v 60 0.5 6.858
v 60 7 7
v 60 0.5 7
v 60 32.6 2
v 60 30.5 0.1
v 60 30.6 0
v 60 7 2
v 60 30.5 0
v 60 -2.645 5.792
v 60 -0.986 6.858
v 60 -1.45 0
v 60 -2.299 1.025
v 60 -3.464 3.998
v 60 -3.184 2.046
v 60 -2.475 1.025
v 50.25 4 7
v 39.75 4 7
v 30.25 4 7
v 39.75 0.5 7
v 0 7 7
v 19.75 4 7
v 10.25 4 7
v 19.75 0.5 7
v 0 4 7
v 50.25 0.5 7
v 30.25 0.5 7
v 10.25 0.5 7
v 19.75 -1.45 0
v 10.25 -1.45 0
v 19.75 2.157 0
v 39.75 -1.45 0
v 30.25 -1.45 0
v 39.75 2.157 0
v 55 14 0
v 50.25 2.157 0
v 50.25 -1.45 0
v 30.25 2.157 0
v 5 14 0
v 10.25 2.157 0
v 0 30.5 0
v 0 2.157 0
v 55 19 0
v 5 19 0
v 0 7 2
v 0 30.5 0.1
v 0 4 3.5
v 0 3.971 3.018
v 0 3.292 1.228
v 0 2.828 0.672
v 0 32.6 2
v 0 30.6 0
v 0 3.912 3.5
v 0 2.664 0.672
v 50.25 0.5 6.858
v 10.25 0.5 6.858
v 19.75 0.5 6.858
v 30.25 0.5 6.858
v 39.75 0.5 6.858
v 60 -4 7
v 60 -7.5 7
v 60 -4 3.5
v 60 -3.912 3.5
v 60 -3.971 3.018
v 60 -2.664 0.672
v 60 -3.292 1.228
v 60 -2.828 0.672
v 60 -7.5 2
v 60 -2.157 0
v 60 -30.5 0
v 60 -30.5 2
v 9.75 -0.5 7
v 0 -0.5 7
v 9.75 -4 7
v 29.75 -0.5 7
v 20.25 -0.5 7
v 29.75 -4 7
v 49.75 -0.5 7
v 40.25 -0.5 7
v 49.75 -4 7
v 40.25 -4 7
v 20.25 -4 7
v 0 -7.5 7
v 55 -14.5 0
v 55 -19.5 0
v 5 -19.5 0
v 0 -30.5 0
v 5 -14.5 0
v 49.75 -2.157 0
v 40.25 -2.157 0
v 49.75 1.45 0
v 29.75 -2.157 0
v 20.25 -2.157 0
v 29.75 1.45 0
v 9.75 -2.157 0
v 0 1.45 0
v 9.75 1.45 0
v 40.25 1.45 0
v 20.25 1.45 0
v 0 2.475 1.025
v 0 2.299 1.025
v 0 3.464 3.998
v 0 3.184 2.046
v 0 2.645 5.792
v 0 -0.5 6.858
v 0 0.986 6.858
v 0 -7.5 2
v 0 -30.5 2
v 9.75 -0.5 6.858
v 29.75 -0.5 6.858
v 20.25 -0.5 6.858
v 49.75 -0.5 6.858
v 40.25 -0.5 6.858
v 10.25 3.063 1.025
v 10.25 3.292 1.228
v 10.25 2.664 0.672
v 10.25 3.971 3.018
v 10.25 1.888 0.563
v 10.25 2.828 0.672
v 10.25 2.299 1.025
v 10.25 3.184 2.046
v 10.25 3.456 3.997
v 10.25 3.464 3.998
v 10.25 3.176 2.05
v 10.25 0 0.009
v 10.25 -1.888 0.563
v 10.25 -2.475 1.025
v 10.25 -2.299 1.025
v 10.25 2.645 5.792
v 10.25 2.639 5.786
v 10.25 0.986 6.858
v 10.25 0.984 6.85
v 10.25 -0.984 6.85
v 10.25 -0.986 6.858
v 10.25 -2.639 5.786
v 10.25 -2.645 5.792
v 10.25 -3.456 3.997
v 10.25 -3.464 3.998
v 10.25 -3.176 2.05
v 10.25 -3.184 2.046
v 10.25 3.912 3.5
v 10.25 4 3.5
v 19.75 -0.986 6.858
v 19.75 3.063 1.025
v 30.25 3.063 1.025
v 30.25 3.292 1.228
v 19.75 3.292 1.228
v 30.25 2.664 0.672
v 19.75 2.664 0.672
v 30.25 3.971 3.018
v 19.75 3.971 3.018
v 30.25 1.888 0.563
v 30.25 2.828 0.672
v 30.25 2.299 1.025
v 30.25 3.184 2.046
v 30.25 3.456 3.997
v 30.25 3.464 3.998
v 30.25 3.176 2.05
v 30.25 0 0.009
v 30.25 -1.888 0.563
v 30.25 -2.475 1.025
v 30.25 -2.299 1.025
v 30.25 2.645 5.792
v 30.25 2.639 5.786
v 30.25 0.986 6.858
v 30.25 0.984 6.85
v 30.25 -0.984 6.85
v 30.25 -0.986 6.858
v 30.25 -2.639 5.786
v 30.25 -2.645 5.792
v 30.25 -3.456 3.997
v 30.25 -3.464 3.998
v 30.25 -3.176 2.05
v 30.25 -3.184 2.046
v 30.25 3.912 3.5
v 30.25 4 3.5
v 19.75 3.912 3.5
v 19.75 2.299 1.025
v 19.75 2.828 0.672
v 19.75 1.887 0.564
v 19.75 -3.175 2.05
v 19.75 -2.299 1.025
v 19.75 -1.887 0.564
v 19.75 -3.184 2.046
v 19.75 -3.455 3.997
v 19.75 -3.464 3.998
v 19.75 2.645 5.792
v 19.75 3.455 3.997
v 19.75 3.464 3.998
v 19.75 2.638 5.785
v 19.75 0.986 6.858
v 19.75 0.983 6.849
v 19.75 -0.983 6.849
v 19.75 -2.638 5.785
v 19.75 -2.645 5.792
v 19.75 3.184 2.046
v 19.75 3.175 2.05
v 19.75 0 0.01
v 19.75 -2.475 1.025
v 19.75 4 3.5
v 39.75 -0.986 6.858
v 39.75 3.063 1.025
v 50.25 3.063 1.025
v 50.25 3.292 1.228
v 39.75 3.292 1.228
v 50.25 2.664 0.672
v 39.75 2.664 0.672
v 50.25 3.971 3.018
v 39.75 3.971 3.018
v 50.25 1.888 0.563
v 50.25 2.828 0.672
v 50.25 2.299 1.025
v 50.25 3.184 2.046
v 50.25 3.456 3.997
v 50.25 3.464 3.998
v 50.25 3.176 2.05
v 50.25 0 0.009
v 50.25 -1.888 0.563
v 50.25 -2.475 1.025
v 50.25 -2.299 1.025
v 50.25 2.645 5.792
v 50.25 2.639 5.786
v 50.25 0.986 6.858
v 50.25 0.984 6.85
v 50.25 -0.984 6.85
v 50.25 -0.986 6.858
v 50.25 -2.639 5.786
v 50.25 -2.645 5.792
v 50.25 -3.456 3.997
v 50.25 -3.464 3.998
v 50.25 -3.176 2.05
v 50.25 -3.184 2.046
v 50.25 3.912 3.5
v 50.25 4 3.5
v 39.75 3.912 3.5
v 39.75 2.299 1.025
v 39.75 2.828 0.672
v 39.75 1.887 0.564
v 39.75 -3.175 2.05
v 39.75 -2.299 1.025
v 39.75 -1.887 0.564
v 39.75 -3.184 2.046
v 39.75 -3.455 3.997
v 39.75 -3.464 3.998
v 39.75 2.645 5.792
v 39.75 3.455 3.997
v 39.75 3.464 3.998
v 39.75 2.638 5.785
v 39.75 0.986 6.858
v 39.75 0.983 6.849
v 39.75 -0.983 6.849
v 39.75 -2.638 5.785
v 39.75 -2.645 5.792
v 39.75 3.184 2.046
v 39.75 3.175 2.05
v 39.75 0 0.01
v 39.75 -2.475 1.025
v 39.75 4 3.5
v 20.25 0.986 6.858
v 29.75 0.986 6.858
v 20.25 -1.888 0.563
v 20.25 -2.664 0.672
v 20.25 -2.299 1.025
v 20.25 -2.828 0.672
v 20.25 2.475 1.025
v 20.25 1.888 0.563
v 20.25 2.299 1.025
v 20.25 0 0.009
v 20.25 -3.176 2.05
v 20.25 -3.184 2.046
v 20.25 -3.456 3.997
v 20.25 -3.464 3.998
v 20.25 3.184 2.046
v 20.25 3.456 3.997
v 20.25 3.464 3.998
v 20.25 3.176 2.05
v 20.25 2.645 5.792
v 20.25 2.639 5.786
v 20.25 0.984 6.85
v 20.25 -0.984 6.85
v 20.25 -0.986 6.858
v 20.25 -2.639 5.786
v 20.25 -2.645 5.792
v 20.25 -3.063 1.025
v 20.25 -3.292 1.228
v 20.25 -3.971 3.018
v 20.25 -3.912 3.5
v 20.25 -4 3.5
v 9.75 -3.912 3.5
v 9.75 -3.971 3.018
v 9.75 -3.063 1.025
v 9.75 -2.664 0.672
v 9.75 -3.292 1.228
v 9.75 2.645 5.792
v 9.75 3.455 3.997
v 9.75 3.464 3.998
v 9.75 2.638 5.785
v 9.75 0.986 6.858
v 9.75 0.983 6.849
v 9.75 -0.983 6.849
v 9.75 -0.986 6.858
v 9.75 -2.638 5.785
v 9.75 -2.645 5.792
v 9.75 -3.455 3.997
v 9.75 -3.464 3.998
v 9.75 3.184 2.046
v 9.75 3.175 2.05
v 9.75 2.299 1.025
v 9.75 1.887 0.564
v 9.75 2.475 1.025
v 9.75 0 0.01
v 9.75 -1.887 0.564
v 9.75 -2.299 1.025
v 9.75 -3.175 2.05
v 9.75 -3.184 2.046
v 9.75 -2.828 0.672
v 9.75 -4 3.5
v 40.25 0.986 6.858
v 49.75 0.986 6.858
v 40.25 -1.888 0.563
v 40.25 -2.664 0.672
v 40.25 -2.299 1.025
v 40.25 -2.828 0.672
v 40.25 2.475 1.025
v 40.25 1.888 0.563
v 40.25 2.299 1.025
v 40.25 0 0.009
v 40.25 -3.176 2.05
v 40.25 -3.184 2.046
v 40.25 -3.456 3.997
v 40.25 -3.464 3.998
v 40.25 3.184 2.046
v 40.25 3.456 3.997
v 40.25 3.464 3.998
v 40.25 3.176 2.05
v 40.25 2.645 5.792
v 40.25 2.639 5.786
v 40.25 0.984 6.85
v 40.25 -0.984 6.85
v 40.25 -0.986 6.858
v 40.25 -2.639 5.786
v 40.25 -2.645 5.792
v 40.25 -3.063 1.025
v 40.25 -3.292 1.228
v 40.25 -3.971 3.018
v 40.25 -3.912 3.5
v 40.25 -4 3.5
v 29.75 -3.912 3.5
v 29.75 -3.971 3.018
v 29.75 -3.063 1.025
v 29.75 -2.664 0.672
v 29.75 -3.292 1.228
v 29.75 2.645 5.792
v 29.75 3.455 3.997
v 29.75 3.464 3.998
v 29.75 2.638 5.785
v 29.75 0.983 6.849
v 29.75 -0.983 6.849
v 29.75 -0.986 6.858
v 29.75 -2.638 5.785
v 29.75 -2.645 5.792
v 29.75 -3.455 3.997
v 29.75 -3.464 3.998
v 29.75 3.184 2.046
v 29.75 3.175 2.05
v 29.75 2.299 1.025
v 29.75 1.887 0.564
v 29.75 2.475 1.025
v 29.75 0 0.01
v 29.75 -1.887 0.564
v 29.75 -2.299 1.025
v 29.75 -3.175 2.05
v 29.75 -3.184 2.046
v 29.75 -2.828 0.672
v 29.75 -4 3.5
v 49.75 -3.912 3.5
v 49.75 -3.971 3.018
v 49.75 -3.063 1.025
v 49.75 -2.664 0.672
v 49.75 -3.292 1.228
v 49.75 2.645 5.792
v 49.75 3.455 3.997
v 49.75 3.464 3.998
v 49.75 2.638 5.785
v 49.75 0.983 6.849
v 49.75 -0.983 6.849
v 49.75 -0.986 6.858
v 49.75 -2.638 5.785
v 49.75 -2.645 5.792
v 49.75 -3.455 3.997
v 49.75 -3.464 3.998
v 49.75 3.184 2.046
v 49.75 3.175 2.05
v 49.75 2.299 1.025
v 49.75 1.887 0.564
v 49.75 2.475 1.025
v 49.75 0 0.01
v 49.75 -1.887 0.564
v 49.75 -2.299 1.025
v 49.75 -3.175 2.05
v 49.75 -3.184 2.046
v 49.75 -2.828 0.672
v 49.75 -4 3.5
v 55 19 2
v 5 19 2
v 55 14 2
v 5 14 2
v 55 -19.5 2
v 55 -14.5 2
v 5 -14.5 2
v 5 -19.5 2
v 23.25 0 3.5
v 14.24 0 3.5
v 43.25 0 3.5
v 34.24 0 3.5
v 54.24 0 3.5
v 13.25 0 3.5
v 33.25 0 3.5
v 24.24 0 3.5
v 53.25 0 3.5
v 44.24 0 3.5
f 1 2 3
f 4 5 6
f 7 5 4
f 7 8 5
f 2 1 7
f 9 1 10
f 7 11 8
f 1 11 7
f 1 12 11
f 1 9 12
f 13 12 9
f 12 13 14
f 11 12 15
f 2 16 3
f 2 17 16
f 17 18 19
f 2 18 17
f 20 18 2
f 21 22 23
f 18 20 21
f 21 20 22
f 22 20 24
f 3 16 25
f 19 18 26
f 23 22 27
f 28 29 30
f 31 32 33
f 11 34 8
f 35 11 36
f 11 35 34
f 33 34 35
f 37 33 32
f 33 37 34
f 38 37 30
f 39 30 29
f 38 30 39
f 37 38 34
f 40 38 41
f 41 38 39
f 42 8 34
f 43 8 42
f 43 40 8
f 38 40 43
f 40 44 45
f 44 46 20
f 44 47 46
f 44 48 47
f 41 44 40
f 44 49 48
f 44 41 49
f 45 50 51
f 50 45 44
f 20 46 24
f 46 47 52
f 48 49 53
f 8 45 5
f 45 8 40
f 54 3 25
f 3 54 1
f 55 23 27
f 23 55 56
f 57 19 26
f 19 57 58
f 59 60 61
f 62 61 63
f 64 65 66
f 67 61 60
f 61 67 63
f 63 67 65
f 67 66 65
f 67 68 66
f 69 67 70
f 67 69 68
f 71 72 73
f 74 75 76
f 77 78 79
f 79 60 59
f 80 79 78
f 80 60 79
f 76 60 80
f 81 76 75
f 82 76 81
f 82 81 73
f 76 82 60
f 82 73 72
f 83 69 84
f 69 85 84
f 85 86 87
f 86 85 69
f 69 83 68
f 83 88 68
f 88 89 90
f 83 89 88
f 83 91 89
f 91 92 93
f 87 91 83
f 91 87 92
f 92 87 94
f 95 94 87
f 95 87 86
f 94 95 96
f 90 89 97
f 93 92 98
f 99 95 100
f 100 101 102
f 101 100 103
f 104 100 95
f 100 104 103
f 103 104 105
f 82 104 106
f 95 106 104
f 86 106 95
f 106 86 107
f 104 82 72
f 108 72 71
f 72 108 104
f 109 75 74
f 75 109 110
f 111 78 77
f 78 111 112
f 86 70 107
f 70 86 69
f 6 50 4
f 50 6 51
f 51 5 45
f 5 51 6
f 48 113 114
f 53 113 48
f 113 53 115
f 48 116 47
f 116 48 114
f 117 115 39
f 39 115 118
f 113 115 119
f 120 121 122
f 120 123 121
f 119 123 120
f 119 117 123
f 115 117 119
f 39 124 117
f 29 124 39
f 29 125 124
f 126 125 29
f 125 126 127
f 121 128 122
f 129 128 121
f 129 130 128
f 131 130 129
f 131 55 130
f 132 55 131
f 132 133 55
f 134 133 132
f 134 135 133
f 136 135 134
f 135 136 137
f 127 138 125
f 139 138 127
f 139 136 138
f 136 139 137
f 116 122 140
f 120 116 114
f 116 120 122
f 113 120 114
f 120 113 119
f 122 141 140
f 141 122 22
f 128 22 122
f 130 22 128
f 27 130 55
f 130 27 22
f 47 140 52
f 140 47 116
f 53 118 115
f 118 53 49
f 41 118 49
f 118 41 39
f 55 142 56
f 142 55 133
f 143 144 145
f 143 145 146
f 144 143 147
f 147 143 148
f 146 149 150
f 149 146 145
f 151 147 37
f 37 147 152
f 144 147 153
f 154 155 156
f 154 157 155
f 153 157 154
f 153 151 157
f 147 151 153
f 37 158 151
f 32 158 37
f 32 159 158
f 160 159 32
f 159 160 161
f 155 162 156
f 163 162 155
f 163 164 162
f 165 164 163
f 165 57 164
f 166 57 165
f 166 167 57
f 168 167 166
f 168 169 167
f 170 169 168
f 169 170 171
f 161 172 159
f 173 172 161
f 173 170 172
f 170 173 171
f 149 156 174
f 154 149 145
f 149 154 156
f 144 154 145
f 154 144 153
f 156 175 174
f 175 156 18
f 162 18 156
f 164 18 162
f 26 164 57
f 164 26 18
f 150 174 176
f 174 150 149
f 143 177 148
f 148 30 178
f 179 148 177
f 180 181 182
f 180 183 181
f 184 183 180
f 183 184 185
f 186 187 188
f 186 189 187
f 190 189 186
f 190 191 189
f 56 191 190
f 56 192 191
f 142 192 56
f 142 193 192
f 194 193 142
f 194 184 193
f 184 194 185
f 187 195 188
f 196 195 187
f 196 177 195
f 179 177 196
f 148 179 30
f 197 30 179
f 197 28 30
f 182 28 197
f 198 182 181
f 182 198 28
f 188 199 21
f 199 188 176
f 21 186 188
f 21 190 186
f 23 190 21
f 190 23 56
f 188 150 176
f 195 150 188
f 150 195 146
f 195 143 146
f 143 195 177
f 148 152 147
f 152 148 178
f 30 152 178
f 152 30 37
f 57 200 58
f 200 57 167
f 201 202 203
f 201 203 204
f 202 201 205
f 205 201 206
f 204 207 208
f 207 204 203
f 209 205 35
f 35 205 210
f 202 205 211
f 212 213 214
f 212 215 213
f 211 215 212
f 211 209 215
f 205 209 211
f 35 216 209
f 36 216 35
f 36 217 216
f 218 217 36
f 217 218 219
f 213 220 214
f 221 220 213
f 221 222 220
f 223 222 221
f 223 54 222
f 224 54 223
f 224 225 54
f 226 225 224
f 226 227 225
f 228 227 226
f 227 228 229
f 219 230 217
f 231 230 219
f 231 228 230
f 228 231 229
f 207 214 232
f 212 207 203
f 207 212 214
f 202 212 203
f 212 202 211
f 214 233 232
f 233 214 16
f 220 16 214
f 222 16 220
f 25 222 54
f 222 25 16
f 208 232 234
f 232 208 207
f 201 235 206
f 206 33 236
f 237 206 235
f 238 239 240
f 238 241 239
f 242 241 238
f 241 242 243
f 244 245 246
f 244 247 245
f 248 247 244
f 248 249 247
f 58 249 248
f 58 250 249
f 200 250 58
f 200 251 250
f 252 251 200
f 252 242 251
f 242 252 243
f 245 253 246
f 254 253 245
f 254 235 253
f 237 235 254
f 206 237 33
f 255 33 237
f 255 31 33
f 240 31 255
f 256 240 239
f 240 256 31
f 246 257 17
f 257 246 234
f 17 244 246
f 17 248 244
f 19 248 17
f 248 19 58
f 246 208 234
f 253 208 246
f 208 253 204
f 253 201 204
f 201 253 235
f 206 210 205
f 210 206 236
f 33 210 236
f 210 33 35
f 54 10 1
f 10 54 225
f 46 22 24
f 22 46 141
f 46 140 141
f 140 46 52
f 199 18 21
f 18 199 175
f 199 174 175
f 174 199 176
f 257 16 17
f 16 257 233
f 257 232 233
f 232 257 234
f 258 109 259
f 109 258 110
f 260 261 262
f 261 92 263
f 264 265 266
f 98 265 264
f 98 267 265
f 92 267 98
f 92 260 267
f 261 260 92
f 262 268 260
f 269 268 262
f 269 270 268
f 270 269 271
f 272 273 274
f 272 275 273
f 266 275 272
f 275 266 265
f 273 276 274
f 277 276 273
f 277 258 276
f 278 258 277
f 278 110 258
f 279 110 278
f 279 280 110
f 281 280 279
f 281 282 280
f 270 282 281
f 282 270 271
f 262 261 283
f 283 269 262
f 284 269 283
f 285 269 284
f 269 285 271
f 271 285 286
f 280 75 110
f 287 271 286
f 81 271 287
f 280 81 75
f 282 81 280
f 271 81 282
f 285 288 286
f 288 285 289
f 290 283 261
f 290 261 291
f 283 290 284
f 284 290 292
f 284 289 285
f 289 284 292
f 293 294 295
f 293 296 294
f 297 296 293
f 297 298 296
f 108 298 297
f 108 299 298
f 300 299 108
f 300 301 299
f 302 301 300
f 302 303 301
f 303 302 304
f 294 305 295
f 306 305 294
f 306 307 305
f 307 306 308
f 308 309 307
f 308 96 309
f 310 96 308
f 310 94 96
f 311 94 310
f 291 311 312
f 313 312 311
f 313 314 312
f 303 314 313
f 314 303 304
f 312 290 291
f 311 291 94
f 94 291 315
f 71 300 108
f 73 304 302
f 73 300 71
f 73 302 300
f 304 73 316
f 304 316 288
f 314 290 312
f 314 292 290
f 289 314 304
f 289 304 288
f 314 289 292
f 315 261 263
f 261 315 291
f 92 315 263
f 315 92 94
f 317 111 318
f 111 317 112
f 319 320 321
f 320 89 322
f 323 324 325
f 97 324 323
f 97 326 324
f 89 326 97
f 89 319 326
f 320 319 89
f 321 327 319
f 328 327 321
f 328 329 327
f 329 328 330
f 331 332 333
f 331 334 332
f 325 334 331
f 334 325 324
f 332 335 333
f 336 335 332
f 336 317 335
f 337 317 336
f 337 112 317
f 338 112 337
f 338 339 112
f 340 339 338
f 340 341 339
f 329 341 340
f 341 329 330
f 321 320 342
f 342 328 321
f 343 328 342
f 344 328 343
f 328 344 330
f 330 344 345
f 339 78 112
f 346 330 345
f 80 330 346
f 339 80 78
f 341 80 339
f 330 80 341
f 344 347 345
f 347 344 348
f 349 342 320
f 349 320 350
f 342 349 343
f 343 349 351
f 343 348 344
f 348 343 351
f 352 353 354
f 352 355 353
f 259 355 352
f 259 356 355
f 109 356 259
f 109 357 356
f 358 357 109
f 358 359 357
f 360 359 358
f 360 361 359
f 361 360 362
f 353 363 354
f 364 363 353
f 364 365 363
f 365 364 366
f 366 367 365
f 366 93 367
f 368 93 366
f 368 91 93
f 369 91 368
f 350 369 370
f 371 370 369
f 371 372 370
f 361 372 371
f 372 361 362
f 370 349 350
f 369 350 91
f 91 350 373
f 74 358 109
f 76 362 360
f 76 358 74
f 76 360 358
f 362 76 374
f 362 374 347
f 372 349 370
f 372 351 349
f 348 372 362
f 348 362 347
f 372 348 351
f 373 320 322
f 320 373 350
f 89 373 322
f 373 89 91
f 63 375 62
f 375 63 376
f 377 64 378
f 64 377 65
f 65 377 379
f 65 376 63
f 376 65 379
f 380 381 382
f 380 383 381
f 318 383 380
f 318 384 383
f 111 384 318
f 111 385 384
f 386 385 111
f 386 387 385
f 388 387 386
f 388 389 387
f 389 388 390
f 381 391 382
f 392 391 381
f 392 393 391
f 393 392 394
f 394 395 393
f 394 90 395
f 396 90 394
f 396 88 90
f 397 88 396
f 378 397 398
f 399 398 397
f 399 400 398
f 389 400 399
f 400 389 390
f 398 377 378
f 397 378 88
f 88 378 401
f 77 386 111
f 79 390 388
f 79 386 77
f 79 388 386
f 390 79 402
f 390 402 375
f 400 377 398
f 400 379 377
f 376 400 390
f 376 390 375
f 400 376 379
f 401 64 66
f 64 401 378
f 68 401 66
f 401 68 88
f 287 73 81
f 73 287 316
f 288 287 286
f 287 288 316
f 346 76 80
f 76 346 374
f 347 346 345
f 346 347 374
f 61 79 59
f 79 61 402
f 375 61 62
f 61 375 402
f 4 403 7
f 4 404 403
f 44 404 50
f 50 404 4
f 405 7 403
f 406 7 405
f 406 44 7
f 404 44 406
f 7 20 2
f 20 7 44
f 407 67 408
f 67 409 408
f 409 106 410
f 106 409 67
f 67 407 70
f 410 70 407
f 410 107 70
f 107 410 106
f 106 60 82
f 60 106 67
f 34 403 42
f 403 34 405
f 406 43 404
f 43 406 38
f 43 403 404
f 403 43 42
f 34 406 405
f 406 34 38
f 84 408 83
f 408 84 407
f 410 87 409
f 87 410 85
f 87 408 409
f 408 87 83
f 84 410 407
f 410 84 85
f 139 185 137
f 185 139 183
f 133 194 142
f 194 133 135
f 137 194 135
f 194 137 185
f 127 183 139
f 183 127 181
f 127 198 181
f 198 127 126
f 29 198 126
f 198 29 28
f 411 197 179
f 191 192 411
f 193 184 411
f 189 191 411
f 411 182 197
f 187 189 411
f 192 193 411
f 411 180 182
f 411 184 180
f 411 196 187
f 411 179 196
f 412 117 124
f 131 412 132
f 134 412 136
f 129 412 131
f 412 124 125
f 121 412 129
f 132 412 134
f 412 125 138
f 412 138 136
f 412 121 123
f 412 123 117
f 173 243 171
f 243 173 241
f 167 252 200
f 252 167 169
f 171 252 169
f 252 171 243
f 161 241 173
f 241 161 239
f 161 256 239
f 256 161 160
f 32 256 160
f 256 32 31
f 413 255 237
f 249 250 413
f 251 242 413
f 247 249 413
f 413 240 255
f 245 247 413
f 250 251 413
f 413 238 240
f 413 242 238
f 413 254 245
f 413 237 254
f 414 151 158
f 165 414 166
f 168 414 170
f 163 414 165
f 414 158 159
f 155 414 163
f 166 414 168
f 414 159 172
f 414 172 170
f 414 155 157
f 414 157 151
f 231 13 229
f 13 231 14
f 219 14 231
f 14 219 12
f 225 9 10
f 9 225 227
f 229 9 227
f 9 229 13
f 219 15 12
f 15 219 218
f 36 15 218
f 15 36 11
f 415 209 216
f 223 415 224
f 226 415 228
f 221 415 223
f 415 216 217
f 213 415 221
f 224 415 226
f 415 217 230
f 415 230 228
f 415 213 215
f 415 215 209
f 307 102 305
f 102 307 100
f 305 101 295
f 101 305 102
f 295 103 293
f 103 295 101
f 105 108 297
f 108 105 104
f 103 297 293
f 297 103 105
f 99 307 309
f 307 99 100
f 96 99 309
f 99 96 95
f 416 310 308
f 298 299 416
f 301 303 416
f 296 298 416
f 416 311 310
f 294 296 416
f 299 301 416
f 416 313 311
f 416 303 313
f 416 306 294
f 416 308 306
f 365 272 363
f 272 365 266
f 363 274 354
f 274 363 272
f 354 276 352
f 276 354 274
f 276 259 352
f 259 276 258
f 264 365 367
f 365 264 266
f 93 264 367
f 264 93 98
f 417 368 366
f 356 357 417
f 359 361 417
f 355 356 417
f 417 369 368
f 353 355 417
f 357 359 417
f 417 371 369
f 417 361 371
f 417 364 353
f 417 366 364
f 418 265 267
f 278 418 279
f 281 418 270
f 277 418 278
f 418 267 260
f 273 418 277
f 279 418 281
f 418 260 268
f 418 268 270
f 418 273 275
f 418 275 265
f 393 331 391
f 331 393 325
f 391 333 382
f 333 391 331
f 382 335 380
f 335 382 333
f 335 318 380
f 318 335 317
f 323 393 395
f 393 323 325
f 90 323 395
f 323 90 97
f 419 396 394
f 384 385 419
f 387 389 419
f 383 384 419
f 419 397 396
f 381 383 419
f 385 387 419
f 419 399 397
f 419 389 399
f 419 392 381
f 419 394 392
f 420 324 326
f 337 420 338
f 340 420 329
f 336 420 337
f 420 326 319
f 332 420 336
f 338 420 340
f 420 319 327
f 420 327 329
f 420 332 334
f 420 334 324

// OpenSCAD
// A library to create print-in-place horizontal hinges.
//
// Copyright (c) 2020 Rodrigo Chandia (rodrigo.chandia@gmail.com)
// All rights reserved.
//
// This program is distributed in the hope that it will be useful,
// but WITHOUT ANY WARRANTY; without even the implied warranty of
// MERCHANTABILITY or FITNESS FOR A PARTICULAR PURPOSE.
//
// The contents of this file are DUAL-LICENSED.  You may modify and/or
// redistribute this software according to the terms of one of the
// following two licenses (at your option):
//
// License 1: Attribution-ShareAlike 4.0 International (CC BY-SA 4.0)
//            https://creativecommons.org/licenses/by-sa/4.0/
//
// License 2: GNU General Public License (GPLv3)
//            https://www.gnu.org/licenses/gpl-3.0.en.html
//
// You should have received a copy of the GNU General Public License
// along with this program. https://www.gnu.org/licenses/
//

module bottomWedge(r, d, rodH, tolerance, other) {
  wedgeH = (r + tolerance) * sin(45);
  wedgeBottom = max(r + tolerance, d);
  wedgeFlip = other ? 1 : -1;
  linear_extrude(height = rodH)
  polygon(points=[
    [wedgeH,wedgeFlip*-r],
    [wedgeH,wedgeFlip*wedgeH],
    [wedgeBottom,wedgeFlip*(wedgeH - (wedgeBottom - wedgeH))],
    [wedgeBottom,wedgeFlip*-r]
  ]);
}

module hingeRodNegative(r, d, h, tolerance, tip, other) {
  difference() {
    translate([0,0,d])
    rotate([0,90,0]) {
      translate([0, 0, -tolerance/2]) {
        rodH = h  + (tip ? tolerance/2 : 0) + tolerance/2;
        cylinder(r = r + tolerance, h = rodH);
        bottomWedge(r, d, rodH, tolerance, other);
      }
      if (tip) {
        translate([0,0,h])
        cylinder(r = r, h = tolerance + 0.01);
        translate([0,0,h + tolerance])
        cylinder(r1 = r, r2 = 0, h = r + tolerance);
      } else {
        translate([0,0,h])
        cylinder(r = r + tolerance, h = tolerance / 2);
      }
    }
    translate([
      -tolerance/2 - 0.01,
      other ? -r - tolerance : 0,
      -0.01])
    cube([h + tolerance + + 0.02 + (tip ? r + tolerance * 1.5 : 0), r + tolerance, d + r + tolerance + 0.02]);
  }
}

module hingeRod(r, d, h, tip, dip, tolerance, negative, other) {
  if (negative) {
    hingeRodNegative(r, d, h, tolerance, tip, other);
  } else {
    toleranceTip = tip ? tolerance/2 : 0;
    toleranceDip = dip ? tolerance/2 : 0;
    translate([0,0,d])
    rotate([0,90,0])
    difference() {
      union() {
        rodH = h - toleranceTip - toleranceDip;
        translate([0,0,toleranceDip]) {
          cylinder(r = r, h = rodH);
          bottomWedge(r, d, rodH, 0, !other);
        }
        if (tip) {
          translate([0,0,h - toleranceTip - 0.01])
          cylinder(r1 = r, r2 = 0, h = r + 0.01);
        }
      }
      if (dip) {
        translate([0,0,toleranceDip-0.01])
        cylinder(r1 = r, r2 = 0, h = r + tolerance);
      }
    }
  }
}

function xor(a, b) = (a && !b) || (b && !a);

module hingeCorner(r, cornerHeight, hingeLength, pieces, other, negative, tolerance) {
  startAtFirst = xor(other, negative);
  for (i = [1:pieces]) {
    if (i % 2 == (startAtFirst ? 0 : 1)) {
      translate([hingeLength / pieces * (i - 1),0,0])
      hingeRod(r, cornerHeight, hingeLength / pieces, i != pieces || cornerHeight > (hingeLength / pieces), i != 1, tolerance, negative, other);
    }
  }
}

module applyHingeCorner(position = [0,0,0], rotation = [0,0,0], r = 3, cornerHeight = 5, hingeLength = 15, pieces = 3, tolerance = 0.3) {
  translate(position)
  for (i = [0:1]) {
    difference() {
      translate(-position)
      children(i);
      rotate(rotation)
      hingeCorner(r, cornerHeight, hingeLength, pieces, i == 0, true, tolerance);
    }
    rotate(rotation)
    hingeCorner(r, cornerHeight, hingeLength, pieces, i == 0, false, tolerance);
  }
  if ($children > 2) {
    children([2:$children-1]);
  }
}

module applyHinges(positions, rotations, r, cornerHeight, hingeLength, pieces, tolerance) {
  difference() {
    children();
    for (j = [0 : 1 : len(positions) - 1]) {
      translate(positions[j])
      rotate([0,0, rotations[j]])
      for (b = [0, 1]) {
        hingeCorner(r, cornerHeight, hingeLength, pieces, b == 0, true, tolerance);
      }
    }
  }
  for (j = [0 : 1 : len(positions) - 1]) {
    translate(positions[j])
    rotate([0,0, rotations[j]])
    for (b = [0, 1]) {
      hingeCorner(r, cornerHeight, hingeLength, pieces, b == 0, false, tolerance);
    }
  }
}

module negativeExtraAngle(position, rotation, cornerHeight, centerHeight, hingeLength, pieces, tolerance, other, angle) {
  translate(position)
  rotate(rotation) {
    startAtFirst = !other;
    l = (cornerHeight + tolerance - centerHeight) / tan(90-angle / 2);
    for (i = [1 : pieces]) {
      if (i % 2 == (startAtFirst ? 0 : 1)) {
        dip = i != 1;
        w = hingeLength / pieces + (dip ? 1 : 0.5) * tolerance;
        positionX = (i - 1) * hingeLength / pieces + (dip ? -tolerance / 2 : 0);
        difference() {
          translate([ positionX, 0, centerHeight])
          rotate([other ? -angle : angle, 0, 0])
          translate([0, other ? -l : 0, -centerHeight])
          cube([w, l, cornerHeight + tolerance]);
          
          translate([positionX - 0.01, other ? -cornerHeight + 0.01 : -0.01, 0])
          cube([w + 0.02, cornerHeight, 2 * cornerHeight]);
          
          diffY = norm([l, cornerHeight + tolerance]);
          translate([positionX - 0.01, other? -0.01 : -diffY - 2 * tolerance + 0.01, cornerHeight + 0.01])
          cube([w + 0.02, diffY + 2 * tolerance, diffY]);
        }
      }    
    }
  }
}

module applyExtraAngle(positions, rotations, cornerHeight, centerHeight, hingeLength, pieces, tolerance, angle) {
  difference() {
    children();
    for (j = [0 : 1 : len(positions) - 1]) {
      negativeExtraAngle(positions[j], rotations[j], cornerHeight, centerHeight, hingeLength, pieces, tolerance, false, angle);
      negativeExtraAngle(positions[j], rotations[j], cornerHeight, centerHeight, hingeLength, pieces, tolerance, true, angle);
    }
  }
}
// /* 
// Examples:

// For each of these examples we position the cubes where we are placing the hinges separated by tolerance = 0.5.
// This can be adjusted according to how precise is your printer.
// Of course you do not need to use two cubes, this can be applied to complex parts.

// An inset hinge manually made with hingeCorner(). It allows for 90 degrees of bend approx.
difference() {
  union() {
    translate([0,0.5,0])
    cube([60,30,7]);
    translate([0,-30.5,0])
    cube([60,30,7]);
    translate([0,30.6,0]) rotate([45,0,0])
    cube([60,6,4]);
  }
  hingeCorner(7/2, 7/2, 60, 6, true, true, 0.5);
  negativeExtraAngle([0,0,0], [0,0,0], 7, 7/2, 60, 6, 0.5, true, 90);
  hingeCorner(7/2, 7/2, 60, 6, false, true, 0.5);
  negativeExtraAngle([0,0,0], [0,0,0], 7, 7/2, 60, 6, 0.5, false, 90);
  // new danp to reduce material and print time
  translate([-0.1, 7, 2]) // thinner part
  cube([60+0.2, 30, 7]);
  translate([-0.1, -30.5-7, 2])
  cube([60+0.2, 30, 7]);
  translate([5, 7*2, -0.1])  // slots
  cube([60-2*5, 5, 7]);
  translate([5, -5.5-7*2, -0.1])
  cube([60-2*5, 5, 7]);
}
hingeCorner(7/2, 7/2, 60, 6, true, false, 0.5);
hingeCorner(7/2, 7/2, 60, 6, false, false, 0.5);
/*
// Same as before but with apply*() functions.
applyHinges([[0,0,0]], [0], 7/2, 7/2, 60, 6, 0.5)
applyExtraAngle([[0,0,0]], [0], 7, 7/2, 60, 6, 0.5, 90)
  union() {
    translate([0,0.5,0])
    cube([60,60,7]);
    translate([0,-60.5,0])
    cube([60,60,7]);
  }

// Half a hinge, 120 degrees of bend approx.
difference() {
  union () {
    translate([0,-60.5,0])
    cube([60,60,7]);
  }
  negativeExtraAngle([0,0,0], [0,0,0], 7, 3.5, 60, 5, 0.5, false, 120);
  hingeCorner(3.5, 3.5, 60, 5, false, true, 0.5);
}
hingeCorner(7/2, 7/2, 60, 5, false, false, 0.5);

// A hinge on the corner. This kind of hinge allows 180 degrees of rotation. No need for extra angle.
// Unlike the previous ones, the boxes do not need to be as long as the hinge.
// Note: Keep r <= cornerHeight.
applyHinges([[0,0,0]], [0], 7/2, 7, 60, 6, 0.5)
  union() {
    translate([-5,0.5,0])
    cube([70,60,7]);
    translate([-5,-60.5,0])
    cube([70,60,7]);
  }

// Half a hinge on the corner. As before, half hinges require manual use of hingeCorner.
difference() {
  union () {
    translate([-5,-60.5,0])
    cube([70,60,7]);
  }
  hingeCorner(3.5, 7, 60, 5, false, true, 0.5);
}
hingeCorner(7/2, 7, 60, 5, false, false, 0.5);
*/
